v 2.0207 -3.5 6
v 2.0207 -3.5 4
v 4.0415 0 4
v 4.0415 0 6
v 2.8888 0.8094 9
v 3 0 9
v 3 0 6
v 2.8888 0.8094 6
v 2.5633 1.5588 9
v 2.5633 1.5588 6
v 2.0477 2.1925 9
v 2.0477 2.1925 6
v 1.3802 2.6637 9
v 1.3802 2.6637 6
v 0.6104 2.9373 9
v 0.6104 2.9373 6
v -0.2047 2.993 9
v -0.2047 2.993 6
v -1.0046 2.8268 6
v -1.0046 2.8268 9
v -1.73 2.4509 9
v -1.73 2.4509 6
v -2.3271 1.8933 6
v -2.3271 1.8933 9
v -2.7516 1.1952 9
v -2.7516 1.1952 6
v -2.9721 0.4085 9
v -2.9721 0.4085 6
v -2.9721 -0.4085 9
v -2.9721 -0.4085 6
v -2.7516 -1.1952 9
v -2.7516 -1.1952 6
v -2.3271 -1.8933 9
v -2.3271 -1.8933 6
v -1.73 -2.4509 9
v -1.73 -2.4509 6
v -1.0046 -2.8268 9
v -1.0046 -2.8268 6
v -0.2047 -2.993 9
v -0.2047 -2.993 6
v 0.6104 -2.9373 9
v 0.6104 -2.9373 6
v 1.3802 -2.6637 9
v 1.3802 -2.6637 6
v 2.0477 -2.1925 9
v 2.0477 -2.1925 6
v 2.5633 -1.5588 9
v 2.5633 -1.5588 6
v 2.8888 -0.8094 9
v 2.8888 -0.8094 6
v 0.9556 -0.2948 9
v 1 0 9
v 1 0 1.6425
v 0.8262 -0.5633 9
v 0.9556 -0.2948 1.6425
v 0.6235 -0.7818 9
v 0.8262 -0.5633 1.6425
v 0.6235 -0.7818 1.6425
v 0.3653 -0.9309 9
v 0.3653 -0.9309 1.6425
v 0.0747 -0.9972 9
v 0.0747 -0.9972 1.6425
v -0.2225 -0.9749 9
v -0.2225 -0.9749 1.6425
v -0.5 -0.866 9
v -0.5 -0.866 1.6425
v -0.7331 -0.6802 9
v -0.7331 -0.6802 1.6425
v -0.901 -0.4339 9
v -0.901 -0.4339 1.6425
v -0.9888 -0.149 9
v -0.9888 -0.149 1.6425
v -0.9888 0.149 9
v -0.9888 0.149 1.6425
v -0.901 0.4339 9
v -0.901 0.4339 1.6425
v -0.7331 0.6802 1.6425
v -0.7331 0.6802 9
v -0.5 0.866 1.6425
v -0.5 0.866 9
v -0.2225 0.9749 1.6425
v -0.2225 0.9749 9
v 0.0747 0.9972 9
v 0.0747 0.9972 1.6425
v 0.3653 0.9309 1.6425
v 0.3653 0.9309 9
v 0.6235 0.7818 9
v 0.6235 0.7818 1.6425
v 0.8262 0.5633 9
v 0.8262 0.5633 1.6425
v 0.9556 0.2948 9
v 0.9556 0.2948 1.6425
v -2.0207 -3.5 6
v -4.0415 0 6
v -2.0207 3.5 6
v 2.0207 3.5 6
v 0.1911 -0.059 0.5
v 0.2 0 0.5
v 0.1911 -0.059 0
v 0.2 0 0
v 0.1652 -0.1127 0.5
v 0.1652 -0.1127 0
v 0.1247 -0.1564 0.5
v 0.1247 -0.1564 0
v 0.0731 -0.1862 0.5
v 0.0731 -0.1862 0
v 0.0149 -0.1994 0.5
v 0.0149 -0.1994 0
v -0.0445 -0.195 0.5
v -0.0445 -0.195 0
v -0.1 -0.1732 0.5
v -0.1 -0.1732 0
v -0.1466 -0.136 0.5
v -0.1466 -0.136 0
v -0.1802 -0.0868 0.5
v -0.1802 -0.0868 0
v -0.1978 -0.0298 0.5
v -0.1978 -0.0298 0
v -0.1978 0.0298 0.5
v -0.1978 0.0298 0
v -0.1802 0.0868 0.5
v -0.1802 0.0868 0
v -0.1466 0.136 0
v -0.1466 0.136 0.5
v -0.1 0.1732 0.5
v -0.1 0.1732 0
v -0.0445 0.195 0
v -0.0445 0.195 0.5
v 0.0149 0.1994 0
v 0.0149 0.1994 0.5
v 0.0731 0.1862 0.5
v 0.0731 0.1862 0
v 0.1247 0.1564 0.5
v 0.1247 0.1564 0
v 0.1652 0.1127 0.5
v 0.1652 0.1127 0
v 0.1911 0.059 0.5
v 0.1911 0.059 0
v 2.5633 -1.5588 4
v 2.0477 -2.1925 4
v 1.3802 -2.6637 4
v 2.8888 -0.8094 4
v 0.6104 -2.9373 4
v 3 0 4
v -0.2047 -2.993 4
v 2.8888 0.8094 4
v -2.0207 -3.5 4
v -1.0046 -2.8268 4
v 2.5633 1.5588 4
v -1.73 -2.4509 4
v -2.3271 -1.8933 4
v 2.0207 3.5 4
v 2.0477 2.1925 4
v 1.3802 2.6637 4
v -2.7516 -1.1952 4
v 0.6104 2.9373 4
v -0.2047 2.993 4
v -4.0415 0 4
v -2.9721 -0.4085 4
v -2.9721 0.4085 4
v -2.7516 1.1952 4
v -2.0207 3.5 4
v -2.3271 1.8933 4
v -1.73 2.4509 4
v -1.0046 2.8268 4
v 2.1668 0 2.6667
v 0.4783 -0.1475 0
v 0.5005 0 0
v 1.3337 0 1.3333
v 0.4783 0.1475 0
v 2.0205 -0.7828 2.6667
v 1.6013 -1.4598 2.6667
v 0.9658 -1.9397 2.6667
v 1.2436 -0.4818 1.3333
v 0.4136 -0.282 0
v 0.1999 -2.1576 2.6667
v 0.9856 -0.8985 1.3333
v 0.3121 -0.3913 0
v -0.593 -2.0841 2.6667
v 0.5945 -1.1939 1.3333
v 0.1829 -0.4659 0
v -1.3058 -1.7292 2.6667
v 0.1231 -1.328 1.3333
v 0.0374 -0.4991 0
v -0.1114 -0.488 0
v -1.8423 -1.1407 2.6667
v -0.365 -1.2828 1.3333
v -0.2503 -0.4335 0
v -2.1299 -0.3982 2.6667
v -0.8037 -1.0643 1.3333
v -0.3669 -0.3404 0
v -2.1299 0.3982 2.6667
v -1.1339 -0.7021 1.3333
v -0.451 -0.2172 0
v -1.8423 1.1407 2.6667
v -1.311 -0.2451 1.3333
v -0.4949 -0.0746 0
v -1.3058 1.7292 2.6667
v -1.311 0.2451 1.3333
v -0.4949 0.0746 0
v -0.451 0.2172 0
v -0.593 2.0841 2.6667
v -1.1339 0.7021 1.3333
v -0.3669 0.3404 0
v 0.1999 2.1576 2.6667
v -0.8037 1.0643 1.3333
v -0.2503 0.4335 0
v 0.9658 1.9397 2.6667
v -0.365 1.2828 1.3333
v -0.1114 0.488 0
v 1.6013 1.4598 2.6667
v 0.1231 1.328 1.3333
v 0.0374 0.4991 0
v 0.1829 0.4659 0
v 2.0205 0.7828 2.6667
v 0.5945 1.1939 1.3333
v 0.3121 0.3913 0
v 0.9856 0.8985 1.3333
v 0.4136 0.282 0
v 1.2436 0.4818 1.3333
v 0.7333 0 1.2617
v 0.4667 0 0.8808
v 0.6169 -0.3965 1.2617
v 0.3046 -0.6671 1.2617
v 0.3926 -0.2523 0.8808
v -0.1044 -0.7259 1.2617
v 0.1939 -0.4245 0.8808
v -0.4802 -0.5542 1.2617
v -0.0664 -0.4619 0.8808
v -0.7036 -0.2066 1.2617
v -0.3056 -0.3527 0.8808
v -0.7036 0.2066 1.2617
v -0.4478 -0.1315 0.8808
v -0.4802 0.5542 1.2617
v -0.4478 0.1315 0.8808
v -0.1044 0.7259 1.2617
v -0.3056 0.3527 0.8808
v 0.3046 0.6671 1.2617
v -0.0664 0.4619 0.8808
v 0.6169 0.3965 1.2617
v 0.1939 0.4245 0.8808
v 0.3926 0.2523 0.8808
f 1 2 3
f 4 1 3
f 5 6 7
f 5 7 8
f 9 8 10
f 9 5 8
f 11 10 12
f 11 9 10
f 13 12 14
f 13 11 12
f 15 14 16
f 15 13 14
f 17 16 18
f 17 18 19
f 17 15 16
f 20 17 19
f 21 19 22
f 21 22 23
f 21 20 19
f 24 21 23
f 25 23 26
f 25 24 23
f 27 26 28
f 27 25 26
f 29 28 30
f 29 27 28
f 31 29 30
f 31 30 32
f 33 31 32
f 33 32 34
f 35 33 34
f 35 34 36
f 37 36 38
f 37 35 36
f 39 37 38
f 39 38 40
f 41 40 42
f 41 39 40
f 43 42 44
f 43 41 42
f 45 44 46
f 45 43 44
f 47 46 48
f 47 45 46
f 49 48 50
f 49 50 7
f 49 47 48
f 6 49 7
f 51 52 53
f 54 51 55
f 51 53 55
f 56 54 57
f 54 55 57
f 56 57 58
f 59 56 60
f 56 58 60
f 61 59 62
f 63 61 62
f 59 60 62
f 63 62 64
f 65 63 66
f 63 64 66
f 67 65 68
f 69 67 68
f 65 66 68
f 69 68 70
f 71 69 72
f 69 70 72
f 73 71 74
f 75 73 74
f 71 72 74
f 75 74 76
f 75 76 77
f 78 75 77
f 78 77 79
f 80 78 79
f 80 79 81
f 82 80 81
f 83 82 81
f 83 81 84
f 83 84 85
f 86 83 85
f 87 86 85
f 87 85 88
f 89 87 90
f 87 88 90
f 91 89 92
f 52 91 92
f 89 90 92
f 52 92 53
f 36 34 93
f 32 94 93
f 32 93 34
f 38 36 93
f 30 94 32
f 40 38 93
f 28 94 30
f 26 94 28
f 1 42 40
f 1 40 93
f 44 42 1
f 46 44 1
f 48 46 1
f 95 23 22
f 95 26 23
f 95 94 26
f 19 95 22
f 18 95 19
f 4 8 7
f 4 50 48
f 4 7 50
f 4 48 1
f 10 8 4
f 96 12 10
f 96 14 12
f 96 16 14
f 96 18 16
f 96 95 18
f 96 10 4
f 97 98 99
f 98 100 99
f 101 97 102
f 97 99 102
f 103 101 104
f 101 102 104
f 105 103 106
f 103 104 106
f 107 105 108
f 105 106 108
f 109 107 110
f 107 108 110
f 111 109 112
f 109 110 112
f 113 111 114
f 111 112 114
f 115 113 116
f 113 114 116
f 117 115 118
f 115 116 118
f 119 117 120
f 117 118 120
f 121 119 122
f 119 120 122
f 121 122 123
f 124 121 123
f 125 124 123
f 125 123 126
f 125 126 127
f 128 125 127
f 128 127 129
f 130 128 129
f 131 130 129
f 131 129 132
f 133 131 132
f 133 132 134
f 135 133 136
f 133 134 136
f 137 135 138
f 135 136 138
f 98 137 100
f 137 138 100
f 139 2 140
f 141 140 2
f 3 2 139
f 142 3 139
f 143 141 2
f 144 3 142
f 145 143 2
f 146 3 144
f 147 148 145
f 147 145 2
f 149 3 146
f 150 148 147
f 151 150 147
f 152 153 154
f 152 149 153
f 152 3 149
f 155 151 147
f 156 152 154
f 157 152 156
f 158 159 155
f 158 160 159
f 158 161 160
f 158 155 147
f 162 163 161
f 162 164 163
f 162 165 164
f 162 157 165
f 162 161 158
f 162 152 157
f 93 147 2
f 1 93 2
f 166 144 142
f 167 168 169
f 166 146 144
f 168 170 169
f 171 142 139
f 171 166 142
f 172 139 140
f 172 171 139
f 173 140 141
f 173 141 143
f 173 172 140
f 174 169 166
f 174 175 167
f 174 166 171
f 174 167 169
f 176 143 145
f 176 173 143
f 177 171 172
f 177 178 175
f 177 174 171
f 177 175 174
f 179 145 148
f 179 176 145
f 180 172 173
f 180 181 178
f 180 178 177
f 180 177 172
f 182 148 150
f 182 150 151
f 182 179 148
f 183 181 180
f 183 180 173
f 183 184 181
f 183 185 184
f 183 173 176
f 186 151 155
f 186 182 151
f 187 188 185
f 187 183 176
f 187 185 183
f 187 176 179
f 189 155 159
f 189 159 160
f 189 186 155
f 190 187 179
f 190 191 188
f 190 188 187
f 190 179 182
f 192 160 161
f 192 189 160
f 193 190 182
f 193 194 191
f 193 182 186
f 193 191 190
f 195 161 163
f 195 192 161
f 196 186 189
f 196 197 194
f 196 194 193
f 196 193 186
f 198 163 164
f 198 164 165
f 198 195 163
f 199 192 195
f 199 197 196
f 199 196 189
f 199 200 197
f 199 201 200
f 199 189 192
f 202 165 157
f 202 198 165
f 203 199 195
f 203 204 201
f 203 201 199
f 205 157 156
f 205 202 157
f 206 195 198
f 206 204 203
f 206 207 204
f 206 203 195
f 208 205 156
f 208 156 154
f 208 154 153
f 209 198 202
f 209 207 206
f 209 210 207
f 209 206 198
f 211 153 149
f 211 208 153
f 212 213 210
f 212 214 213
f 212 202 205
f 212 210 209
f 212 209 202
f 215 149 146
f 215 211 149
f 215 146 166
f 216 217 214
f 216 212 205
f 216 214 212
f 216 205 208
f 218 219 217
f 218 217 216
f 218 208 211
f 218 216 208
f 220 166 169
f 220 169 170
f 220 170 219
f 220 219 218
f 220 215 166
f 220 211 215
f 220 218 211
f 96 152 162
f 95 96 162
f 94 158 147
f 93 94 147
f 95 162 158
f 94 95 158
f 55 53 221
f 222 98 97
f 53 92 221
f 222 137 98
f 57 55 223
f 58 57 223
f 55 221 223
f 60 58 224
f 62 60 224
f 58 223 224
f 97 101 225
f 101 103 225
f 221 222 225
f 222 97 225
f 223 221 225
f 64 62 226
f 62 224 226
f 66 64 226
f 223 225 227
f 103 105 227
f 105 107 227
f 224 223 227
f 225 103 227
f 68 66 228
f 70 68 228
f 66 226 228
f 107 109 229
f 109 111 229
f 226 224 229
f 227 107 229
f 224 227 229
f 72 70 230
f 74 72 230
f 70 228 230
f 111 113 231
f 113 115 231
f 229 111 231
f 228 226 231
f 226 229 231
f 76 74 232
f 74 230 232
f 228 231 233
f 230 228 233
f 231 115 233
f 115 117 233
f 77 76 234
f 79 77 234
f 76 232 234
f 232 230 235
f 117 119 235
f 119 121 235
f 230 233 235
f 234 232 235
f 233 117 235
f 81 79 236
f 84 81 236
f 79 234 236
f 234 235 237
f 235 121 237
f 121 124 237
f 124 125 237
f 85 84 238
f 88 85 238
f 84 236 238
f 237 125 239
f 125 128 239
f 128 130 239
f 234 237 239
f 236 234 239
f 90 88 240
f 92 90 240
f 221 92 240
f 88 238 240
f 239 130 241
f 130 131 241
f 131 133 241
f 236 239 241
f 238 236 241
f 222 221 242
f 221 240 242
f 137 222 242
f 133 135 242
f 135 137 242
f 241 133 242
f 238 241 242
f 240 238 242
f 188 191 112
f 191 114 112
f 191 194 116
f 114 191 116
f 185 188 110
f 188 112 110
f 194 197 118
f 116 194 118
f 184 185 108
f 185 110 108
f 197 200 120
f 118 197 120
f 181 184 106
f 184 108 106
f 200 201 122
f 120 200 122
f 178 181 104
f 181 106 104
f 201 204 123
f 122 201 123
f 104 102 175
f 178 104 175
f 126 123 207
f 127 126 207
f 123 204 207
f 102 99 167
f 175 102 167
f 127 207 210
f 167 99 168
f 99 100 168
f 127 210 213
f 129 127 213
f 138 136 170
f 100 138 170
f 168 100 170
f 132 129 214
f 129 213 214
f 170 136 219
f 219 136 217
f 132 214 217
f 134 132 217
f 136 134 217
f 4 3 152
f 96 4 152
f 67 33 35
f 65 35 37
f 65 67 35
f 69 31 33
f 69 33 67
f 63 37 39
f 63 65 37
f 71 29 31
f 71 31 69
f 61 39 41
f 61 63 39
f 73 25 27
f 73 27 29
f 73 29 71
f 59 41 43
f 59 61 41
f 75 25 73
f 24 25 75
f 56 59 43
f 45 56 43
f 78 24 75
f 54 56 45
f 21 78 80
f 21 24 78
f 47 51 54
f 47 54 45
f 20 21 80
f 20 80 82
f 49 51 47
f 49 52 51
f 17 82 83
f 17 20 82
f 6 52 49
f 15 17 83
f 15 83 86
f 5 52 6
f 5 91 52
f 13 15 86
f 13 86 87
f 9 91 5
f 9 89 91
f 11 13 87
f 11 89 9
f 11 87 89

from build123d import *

# Parameters (mm, degrees)
BOSS_EXTRU_1_DEPTH      = 9
ESQUISSE2_W             = 19.623971562
ESQUISSE2_H             = 15.534154535
ESQUISSE2_R             = 3
ENL_V_MAT_EXTRU_1_DEPTH = 3
ENL_V_START             = -4
ESQUISSE3_W             = 11.267201257
ESQUISSE3_H             = 13.961169169
ESQUISSE3_R             = 3
ENL_V_MAT_EXTRU_2_DEPTH = 4
CHANFREIN1_SIZE         = 4
CHANFREIN1_SIZE_2       = 2.499477408


with BuildPart() as part:
    # Esquisse1 → Boss.-Extru.1 (new body)
    with BuildSketch(Plane.XY):
        Polygon((4.041451884, 0), (2.020725942, 3.5), (-2.020725942, 3.5), (-4.041451884, 0), (-2.020725942, -3.5), (2.020725942, -3.5), align=None)
    extrude(amount=BOSS_EXTRU_1_DEPTH)

    # Esquisse2 → Enlèv. mat.-Extru.1 (cut)
    with BuildSketch(Plane.XY.offset(9)):
        with Locations((0.327116653, -1.544441398)):
            Rectangle(ESQUISSE2_W, ESQUISSE2_H)
        Circle(ESQUISSE2_R, mode=Mode.SUBTRACT)
    extrude(amount=-ENL_V_MAT_EXTRU_1_DEPTH, mode=Mode.SUBTRACT)

    # Esquisse3 → Enlèv. mat.-Extru.2 (cut)
    with BuildSketch(Plane(origin=(0, 0, 0), x_dir=(-1, 0, 0), z_dir=(0, 0, -1)).offset(ENL_V_START)):
        with Locations((0.009770186, 0.039262349)):
            Rectangle(ESQUISSE3_W, ESQUISSE3_H)
        with Locations(Location((0, 0, 0), (0, 0, 180))):
            Circle(ESQUISSE3_R, mode=Mode.SUBTRACT)
    extrude(amount=ENL_V_MAT_EXTRU_2_DEPTH, mode=Mode.SUBTRACT)

    # Chanfrein1
    # the kernel refuses this chamfer: 4, 2.499477408 mm, written as the material it takes off along each edge
    with BuildSketch(Plane(origin=(0, 0, 0), x_dir=(1, 0, 0), z_dir=(0, 1, 0))) as chanfrein1_piece_1_section:
        Polygon((3, -CHANFREIN1_SIZE), (3 - CHANFREIN1_SIZE_2, 0), (3, 0), align=None)
    chanfrein1_piece_1 = revolve(axis=Axis((0, 0, 0), (0, 0, -1)), mode=Mode.PRIVATE)
    chanfrein1_piece_1 = split(chanfrein1_piece_1, bisect_by=Plane(origin=(-1.744026904, 0, 4), z_dir=(0, 0, -1)), keep=Keep.TOP, mode=Mode.PRIVATE)
    add(chanfrein1_piece_1, mode=Mode.SUBTRACT)

    # Esquisse4 → Enlèvement de matière-Révolution1 (revolve, cut)
    with BuildSketch(Plane(origin=(0, 0, 0), x_dir=(1, 0, 0), z_dir=(0, 1, 0))):
        Polygon((0, -9), (1, -9), (1, -1.642518405), (0.2, -0.5), (0.2, 0), (0, 0), align=None)
    revolve(axis=Axis((0, 0, 9.404603351), (0, 0, -1)), mode=Mode.SUBTRACT)


solid = part.part
